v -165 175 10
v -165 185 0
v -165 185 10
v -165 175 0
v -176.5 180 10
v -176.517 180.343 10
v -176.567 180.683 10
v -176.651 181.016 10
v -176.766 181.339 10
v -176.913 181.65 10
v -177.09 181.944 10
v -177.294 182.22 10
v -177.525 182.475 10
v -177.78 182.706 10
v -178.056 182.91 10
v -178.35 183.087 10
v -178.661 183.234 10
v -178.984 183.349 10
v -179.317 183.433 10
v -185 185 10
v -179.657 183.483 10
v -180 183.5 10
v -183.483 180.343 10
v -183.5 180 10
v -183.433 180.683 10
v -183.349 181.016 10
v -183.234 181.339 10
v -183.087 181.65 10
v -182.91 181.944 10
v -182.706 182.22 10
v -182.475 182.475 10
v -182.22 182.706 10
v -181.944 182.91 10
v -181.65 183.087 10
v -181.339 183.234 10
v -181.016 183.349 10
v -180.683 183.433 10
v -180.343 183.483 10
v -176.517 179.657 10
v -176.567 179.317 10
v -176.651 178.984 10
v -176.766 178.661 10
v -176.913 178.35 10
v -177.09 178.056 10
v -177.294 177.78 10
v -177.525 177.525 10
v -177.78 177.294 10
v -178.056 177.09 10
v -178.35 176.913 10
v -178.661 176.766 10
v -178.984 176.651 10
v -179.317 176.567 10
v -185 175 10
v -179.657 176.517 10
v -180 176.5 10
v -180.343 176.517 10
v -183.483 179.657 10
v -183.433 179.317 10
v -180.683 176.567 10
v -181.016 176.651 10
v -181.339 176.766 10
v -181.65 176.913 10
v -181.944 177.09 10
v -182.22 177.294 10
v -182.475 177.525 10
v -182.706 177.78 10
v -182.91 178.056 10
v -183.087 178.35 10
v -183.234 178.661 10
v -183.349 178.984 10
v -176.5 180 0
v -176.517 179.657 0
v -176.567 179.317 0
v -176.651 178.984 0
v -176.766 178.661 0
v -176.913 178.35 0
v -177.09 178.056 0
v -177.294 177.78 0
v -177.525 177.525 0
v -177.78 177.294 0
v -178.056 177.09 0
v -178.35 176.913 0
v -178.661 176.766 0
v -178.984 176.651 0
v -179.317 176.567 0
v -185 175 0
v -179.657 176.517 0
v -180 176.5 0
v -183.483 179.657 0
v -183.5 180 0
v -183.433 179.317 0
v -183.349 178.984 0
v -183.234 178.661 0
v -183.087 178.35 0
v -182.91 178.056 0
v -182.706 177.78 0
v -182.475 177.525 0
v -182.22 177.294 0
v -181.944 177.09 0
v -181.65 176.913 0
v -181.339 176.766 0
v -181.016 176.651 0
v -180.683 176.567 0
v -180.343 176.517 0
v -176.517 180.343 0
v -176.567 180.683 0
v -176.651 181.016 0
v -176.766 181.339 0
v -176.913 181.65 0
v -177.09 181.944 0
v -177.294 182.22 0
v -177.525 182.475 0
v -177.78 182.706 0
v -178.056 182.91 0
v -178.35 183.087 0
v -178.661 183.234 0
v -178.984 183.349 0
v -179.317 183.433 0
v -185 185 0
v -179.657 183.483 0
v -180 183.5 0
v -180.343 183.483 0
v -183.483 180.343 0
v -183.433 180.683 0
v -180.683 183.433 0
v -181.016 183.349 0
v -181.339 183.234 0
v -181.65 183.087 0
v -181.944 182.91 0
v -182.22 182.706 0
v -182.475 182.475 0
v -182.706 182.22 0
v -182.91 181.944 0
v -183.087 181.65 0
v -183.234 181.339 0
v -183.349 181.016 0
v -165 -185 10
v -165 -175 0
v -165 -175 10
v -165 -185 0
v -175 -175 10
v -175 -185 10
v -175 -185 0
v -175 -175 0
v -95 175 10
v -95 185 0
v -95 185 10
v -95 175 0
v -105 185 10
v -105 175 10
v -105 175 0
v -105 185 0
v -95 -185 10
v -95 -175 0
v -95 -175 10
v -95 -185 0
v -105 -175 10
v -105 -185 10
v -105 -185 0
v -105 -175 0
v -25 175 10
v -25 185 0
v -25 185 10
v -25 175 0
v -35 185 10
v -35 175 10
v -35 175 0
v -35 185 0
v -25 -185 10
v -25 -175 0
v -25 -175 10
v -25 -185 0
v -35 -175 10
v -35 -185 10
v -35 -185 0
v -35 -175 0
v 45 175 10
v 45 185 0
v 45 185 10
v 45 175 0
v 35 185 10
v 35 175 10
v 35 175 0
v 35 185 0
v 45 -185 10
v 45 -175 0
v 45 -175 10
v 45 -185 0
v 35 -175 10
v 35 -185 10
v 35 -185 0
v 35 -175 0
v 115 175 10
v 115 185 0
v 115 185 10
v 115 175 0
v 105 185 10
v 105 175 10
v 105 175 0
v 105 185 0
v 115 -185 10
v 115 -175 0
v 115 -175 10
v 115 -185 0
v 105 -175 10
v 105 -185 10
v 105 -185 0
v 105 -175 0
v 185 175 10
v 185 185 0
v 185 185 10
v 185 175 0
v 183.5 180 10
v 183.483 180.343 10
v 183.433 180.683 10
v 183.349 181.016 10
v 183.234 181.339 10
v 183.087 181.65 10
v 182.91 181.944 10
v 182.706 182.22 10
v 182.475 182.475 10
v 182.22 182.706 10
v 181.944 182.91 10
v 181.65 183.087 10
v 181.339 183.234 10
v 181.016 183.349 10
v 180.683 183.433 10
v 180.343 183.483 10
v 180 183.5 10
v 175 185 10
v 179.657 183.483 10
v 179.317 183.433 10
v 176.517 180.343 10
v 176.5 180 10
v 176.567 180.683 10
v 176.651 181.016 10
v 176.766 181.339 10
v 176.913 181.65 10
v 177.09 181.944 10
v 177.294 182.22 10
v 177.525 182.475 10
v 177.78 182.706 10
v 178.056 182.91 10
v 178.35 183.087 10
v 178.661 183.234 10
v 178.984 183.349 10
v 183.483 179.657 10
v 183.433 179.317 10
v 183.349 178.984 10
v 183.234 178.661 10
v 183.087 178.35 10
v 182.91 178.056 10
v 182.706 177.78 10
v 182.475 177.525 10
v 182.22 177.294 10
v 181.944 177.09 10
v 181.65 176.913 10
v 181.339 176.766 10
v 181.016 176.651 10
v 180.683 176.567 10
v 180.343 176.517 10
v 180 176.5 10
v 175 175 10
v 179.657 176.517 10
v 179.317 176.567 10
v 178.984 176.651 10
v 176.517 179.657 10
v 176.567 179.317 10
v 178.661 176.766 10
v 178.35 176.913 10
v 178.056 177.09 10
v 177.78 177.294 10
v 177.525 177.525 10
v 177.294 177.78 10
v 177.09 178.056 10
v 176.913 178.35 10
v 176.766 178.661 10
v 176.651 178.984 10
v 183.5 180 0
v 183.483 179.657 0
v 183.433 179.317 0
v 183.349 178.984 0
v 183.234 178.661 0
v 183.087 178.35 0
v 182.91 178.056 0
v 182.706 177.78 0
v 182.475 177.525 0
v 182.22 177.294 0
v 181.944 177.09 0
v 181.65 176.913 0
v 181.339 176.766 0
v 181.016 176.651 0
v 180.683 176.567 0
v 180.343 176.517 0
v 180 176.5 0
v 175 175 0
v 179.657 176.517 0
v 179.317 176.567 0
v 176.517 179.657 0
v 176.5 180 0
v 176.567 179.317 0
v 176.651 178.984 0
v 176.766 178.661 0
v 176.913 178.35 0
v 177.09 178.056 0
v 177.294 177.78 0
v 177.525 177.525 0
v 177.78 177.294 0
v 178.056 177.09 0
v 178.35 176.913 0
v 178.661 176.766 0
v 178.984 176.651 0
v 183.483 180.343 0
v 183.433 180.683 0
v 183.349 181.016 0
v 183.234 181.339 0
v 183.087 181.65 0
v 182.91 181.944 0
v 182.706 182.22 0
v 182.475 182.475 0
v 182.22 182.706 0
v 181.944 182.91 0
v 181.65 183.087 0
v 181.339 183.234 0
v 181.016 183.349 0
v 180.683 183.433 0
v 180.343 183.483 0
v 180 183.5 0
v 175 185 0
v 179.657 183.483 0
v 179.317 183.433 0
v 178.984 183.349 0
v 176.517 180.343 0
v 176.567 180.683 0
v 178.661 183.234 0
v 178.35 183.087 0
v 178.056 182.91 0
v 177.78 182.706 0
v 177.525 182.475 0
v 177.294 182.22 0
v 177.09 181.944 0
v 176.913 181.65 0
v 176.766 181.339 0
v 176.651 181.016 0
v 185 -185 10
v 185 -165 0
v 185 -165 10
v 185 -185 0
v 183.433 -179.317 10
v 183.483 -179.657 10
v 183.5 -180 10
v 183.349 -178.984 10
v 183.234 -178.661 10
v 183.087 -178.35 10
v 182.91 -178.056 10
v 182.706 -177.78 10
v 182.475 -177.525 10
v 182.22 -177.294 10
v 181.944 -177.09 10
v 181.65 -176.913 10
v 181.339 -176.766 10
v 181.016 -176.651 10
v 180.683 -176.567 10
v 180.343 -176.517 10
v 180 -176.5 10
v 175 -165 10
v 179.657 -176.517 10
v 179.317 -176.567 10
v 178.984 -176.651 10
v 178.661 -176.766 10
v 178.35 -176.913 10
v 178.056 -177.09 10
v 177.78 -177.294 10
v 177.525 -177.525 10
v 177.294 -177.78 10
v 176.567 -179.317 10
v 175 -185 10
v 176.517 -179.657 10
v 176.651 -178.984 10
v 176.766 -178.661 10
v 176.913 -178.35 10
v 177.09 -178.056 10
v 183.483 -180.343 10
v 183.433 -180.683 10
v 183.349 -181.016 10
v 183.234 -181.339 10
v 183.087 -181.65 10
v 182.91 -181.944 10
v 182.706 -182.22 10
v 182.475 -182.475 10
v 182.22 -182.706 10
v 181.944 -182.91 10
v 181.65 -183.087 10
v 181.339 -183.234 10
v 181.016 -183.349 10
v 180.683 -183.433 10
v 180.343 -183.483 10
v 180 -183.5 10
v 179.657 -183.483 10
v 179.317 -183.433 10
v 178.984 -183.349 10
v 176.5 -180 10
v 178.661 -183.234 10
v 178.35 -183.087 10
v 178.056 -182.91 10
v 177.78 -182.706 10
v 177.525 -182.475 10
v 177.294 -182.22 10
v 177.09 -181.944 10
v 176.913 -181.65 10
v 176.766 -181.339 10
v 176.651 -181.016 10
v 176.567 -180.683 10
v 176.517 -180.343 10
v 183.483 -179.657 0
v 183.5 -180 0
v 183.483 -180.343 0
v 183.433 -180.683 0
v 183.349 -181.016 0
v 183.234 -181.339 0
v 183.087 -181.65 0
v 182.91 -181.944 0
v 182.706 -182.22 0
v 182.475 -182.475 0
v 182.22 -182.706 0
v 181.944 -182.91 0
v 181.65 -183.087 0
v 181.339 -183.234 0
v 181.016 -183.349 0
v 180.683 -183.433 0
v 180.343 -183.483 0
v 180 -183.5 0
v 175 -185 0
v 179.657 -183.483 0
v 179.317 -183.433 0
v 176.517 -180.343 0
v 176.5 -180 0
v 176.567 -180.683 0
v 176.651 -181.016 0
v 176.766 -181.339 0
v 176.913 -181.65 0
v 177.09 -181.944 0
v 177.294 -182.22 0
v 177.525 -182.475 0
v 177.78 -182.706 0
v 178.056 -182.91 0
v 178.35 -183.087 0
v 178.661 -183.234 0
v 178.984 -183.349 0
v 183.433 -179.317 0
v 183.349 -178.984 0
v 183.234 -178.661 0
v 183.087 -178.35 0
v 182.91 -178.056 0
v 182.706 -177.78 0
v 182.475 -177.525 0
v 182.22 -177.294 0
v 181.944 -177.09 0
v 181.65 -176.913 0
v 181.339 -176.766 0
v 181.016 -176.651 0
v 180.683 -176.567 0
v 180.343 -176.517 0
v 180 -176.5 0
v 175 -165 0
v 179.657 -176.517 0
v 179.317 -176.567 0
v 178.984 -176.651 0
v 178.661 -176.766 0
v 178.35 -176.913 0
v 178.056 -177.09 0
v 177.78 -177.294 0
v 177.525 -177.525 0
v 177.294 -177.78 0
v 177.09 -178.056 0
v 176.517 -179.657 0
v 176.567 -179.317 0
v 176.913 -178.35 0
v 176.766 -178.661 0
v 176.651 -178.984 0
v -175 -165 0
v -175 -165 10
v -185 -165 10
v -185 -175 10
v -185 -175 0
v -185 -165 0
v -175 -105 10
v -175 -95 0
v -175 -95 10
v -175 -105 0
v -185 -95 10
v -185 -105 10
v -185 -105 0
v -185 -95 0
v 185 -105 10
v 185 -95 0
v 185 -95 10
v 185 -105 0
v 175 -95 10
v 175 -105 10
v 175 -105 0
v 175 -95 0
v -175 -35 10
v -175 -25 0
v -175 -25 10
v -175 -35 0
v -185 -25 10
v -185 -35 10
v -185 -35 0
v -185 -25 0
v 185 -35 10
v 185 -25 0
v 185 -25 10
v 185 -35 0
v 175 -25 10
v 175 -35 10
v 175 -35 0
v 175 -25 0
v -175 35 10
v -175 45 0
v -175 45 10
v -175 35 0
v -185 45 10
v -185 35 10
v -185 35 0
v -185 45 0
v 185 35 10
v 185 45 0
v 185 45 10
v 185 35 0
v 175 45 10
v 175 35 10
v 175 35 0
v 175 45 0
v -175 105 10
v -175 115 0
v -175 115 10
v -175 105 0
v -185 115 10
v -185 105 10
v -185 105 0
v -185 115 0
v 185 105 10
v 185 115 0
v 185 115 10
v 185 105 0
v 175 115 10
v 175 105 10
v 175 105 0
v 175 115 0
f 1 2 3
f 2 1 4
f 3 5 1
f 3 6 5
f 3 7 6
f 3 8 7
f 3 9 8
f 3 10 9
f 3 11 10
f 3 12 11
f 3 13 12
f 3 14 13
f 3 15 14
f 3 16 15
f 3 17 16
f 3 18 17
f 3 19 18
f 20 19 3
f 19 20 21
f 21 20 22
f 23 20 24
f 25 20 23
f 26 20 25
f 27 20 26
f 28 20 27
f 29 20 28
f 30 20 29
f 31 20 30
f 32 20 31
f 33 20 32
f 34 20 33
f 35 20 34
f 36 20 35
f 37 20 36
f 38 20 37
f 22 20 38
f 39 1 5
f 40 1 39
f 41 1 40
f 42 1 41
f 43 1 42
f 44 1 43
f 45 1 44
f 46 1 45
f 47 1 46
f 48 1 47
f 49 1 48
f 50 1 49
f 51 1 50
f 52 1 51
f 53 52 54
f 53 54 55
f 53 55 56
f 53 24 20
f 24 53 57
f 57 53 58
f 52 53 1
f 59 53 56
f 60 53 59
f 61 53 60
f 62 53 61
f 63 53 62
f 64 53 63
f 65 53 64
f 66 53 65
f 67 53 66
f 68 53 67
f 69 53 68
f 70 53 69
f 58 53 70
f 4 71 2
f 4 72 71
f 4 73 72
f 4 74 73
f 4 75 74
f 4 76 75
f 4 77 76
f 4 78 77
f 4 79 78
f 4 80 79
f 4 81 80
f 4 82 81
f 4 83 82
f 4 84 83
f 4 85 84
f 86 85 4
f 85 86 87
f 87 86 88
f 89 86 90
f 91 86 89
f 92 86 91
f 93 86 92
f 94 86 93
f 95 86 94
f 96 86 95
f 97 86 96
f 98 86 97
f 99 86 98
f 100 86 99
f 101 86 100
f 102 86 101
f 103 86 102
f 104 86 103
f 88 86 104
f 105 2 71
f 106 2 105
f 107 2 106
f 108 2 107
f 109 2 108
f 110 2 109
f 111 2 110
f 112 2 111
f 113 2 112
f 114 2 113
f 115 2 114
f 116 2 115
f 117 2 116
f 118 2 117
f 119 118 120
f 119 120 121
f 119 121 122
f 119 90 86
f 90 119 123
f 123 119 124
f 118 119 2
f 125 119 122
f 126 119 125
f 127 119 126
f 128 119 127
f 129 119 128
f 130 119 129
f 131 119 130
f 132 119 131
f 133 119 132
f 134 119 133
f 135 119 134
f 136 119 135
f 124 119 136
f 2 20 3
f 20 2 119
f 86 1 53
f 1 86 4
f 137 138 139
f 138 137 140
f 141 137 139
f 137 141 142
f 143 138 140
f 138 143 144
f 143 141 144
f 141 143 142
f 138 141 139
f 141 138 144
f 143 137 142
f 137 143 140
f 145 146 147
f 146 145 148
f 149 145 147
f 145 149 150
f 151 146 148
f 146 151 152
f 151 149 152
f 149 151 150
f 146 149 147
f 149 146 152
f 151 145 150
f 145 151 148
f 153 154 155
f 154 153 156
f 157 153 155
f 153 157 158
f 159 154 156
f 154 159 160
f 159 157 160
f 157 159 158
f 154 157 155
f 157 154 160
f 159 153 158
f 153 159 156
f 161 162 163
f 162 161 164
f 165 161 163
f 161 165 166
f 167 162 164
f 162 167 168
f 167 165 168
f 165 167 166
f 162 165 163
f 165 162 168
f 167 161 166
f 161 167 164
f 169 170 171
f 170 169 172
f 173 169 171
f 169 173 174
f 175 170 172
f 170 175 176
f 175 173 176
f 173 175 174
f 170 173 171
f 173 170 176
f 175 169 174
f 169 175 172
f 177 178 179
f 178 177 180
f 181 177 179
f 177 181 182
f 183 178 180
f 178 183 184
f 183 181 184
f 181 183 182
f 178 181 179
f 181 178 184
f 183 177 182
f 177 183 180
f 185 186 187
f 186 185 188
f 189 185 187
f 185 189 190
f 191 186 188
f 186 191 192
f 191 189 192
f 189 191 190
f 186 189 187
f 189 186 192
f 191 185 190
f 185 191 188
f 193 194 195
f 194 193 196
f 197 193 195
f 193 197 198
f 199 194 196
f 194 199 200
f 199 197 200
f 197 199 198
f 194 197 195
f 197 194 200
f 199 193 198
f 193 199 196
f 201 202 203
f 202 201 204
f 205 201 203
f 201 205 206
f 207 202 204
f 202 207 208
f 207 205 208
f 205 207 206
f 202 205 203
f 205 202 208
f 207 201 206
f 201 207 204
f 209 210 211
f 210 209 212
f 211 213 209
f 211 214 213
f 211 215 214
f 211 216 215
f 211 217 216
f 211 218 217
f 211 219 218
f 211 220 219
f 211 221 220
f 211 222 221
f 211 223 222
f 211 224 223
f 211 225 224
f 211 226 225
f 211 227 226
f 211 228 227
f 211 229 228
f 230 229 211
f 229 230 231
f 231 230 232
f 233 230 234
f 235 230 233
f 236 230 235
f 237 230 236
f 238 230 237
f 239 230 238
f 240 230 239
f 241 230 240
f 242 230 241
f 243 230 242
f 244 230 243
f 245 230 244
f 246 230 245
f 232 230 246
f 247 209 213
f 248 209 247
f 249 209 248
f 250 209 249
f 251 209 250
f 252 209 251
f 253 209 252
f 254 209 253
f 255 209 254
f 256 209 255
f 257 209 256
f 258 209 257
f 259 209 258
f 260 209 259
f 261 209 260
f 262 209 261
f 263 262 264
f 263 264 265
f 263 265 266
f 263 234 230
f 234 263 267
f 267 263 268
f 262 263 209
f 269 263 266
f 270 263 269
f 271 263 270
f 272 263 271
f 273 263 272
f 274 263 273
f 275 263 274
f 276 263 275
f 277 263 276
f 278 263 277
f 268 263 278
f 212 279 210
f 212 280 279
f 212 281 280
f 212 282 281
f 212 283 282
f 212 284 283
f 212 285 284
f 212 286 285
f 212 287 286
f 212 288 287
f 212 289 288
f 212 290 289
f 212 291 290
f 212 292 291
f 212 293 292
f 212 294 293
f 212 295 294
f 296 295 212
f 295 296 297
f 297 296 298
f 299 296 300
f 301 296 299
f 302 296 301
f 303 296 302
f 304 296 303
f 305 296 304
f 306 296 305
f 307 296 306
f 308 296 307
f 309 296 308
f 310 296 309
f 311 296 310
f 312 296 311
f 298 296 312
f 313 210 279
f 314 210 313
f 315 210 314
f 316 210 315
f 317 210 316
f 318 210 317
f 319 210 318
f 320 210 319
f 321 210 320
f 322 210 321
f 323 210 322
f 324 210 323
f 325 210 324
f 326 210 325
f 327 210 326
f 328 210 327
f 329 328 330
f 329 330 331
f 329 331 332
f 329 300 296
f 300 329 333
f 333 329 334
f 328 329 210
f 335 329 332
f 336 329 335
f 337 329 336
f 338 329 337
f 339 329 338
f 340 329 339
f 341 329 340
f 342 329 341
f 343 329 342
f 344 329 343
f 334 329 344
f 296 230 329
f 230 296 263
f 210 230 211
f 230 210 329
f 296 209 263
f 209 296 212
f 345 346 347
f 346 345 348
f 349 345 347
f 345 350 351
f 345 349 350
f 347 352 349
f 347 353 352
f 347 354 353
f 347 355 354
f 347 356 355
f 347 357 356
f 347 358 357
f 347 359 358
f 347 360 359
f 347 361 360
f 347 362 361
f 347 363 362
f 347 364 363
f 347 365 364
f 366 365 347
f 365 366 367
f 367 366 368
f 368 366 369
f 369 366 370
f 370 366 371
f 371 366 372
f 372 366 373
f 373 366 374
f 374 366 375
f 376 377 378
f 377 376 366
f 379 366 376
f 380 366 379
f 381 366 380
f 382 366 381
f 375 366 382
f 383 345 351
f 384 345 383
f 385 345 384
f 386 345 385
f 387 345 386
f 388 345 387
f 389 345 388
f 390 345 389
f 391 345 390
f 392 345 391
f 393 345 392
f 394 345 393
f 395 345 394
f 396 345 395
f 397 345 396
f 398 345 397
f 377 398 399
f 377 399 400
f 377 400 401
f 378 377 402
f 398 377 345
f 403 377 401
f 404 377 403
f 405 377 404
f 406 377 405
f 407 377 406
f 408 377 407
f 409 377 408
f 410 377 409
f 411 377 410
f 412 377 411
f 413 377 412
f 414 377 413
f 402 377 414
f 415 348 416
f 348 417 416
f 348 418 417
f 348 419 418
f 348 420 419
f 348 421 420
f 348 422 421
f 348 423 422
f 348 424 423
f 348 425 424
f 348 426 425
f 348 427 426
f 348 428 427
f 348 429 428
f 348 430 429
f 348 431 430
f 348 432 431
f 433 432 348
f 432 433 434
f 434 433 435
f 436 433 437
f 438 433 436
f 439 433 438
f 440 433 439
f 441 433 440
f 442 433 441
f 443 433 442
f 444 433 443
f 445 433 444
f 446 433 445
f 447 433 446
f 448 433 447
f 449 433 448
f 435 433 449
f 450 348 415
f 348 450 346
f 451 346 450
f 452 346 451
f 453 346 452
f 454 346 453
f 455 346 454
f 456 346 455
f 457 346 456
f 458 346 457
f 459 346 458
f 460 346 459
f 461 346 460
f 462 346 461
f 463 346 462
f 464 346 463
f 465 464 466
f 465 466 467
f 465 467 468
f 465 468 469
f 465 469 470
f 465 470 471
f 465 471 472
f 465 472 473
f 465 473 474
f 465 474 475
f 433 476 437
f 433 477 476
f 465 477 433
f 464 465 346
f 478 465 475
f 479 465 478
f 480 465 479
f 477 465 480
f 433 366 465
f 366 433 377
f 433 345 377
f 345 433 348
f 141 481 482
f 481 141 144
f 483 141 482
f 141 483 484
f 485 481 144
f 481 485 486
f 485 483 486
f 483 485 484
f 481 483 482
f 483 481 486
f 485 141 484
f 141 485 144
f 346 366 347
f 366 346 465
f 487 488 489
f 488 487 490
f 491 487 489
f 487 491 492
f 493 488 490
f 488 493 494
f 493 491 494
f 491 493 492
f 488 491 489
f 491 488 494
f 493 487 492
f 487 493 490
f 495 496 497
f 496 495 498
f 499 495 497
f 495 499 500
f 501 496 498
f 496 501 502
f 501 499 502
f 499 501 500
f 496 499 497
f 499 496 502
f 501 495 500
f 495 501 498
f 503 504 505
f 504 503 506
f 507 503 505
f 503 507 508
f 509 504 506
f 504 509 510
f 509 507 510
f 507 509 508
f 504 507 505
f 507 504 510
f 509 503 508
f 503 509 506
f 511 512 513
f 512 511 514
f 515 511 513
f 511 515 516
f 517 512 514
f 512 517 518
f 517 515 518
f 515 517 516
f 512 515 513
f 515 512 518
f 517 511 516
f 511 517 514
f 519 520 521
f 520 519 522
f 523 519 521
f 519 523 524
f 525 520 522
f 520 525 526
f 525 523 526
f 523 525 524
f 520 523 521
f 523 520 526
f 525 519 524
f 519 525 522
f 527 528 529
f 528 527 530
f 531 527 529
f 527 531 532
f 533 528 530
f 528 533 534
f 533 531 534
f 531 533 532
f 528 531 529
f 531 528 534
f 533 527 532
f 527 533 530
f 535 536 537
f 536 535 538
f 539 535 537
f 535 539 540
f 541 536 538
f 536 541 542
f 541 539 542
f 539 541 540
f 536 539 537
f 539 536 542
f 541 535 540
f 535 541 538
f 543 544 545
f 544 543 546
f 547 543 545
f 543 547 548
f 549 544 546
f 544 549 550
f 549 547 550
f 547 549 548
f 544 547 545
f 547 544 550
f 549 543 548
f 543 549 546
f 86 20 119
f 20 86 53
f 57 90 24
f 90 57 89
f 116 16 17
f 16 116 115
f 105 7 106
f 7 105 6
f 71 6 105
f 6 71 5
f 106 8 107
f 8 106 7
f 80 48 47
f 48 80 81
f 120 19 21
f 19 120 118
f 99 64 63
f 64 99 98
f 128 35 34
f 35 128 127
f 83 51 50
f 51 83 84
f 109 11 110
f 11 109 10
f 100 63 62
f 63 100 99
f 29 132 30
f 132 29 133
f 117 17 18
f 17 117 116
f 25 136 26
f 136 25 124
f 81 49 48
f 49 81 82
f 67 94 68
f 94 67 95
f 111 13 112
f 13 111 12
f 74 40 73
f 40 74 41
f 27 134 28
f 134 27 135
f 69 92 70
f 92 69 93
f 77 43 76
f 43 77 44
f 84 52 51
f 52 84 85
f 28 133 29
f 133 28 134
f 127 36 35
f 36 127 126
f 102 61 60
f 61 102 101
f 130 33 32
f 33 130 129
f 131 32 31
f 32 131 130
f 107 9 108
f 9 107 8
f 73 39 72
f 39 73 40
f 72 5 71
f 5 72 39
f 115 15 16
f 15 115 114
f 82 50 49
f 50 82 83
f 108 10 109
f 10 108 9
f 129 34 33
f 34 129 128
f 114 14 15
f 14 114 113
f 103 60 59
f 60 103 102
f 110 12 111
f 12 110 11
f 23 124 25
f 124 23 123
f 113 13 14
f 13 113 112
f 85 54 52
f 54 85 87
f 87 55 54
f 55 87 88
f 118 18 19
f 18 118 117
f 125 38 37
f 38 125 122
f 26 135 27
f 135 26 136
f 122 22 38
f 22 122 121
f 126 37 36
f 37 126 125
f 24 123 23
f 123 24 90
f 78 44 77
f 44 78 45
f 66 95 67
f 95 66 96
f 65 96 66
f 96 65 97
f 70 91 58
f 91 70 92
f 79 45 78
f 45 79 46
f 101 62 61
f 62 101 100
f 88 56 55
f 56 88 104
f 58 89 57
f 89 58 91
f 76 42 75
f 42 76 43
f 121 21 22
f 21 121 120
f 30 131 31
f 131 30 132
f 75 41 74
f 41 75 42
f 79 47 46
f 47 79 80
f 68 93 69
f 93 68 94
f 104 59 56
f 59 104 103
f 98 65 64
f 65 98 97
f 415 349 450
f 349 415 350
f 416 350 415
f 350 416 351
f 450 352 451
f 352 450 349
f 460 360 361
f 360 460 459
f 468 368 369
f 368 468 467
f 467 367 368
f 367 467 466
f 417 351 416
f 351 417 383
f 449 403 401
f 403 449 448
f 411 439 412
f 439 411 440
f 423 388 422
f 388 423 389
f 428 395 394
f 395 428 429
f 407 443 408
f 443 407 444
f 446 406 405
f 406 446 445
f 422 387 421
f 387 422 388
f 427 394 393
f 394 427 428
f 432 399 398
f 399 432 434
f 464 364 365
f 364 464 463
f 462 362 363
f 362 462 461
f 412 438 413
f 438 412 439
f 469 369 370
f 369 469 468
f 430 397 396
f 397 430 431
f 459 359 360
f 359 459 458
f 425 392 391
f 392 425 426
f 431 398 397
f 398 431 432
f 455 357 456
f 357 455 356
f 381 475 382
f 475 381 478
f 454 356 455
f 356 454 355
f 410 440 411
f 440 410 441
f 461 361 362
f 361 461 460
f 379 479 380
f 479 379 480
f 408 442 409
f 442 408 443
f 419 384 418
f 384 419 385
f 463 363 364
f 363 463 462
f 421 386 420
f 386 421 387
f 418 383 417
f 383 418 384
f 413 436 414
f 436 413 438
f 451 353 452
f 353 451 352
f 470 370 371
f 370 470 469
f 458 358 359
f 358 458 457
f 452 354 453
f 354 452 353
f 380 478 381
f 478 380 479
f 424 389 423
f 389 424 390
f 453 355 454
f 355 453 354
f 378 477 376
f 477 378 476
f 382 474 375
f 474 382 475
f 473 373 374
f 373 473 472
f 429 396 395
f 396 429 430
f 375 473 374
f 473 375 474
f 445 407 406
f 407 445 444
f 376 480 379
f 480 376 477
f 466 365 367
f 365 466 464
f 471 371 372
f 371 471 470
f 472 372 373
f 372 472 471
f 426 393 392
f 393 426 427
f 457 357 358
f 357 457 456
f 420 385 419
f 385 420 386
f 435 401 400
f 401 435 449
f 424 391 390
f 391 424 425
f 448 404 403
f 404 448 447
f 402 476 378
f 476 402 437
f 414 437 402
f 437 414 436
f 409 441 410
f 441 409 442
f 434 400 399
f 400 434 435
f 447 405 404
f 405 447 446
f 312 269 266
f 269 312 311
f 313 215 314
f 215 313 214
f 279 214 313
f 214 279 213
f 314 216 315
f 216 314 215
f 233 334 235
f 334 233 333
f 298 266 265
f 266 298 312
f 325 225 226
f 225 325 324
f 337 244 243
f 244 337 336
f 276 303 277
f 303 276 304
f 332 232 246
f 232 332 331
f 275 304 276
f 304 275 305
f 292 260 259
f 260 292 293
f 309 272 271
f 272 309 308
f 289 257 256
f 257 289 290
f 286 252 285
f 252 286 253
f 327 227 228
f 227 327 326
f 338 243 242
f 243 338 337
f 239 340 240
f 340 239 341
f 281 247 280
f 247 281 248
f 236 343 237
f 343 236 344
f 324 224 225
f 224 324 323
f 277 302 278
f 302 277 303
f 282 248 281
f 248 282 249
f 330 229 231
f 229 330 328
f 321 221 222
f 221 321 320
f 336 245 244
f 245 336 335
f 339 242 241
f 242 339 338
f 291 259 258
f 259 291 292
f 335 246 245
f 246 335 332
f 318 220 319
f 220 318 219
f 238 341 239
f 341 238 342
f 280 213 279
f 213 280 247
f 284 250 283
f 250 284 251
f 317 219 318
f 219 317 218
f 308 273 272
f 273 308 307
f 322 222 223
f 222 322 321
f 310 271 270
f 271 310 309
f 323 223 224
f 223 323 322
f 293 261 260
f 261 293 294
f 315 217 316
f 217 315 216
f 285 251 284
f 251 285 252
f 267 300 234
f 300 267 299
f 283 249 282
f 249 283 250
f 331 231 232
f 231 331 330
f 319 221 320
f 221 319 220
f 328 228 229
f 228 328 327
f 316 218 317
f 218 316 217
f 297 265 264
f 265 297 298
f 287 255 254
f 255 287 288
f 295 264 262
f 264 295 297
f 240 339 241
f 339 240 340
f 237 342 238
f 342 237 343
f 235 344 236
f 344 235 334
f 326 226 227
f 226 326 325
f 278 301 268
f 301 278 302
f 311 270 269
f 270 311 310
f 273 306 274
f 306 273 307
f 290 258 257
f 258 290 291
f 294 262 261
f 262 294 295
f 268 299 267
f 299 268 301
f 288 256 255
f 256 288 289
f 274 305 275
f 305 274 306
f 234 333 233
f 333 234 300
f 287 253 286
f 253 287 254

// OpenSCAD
// ring_44.scad - ring index 44 (z bottom = 440 mm)
$fn = 64; bar = 10; half_b = bar/2; outer = 370; half_outer = outer/2;
front_y = 180; back_y = -180; left_x = -180; right_x = 180;
x_centers = [-170, -100, -30, 40, 110, 180];
z_centers = [5, 85, 155, 225, 295, 365, 435, 505, 575, 645, 715]; ring_z = 440;
module place_box(cx, cy, sx, sy) { translate([cx - sx/2, cy - sy/2, 0]) cube([sx, sy, bar]); }

difference() { union() {
    for (x = x_centers) { place_box(x, front_y, bar, bar); place_box(x, back_y, bar, bar); }
    for (y = x_centers) { place_box(left_x, y, bar, bar); place_box(right_x, y, bar, bar); }
    for (zc = z_centers) if ((zc - half_b < ring_z + bar) && (zc + half_b > ring_z)) {
        translate([-half_outer, front_y - half_b, 0]) cube([outer, bar, bar]);
        translate([-half_outer, back_y - half_b, 0])  cube([outer, bar, bar]);
        translate([left_x - half_b, -half_outer, 0])  cube([bar, outer, bar]);
        translate([right_x - half_b, -half_outer, 0]) cube([bar, outer, bar]);
    }
  }
  for (cx = [-180, 180]) for (cy = [-180, 180]) translate([cx, cy, 0]) cylinder(h = bar, r = 3.5, $fn = 64);
}
